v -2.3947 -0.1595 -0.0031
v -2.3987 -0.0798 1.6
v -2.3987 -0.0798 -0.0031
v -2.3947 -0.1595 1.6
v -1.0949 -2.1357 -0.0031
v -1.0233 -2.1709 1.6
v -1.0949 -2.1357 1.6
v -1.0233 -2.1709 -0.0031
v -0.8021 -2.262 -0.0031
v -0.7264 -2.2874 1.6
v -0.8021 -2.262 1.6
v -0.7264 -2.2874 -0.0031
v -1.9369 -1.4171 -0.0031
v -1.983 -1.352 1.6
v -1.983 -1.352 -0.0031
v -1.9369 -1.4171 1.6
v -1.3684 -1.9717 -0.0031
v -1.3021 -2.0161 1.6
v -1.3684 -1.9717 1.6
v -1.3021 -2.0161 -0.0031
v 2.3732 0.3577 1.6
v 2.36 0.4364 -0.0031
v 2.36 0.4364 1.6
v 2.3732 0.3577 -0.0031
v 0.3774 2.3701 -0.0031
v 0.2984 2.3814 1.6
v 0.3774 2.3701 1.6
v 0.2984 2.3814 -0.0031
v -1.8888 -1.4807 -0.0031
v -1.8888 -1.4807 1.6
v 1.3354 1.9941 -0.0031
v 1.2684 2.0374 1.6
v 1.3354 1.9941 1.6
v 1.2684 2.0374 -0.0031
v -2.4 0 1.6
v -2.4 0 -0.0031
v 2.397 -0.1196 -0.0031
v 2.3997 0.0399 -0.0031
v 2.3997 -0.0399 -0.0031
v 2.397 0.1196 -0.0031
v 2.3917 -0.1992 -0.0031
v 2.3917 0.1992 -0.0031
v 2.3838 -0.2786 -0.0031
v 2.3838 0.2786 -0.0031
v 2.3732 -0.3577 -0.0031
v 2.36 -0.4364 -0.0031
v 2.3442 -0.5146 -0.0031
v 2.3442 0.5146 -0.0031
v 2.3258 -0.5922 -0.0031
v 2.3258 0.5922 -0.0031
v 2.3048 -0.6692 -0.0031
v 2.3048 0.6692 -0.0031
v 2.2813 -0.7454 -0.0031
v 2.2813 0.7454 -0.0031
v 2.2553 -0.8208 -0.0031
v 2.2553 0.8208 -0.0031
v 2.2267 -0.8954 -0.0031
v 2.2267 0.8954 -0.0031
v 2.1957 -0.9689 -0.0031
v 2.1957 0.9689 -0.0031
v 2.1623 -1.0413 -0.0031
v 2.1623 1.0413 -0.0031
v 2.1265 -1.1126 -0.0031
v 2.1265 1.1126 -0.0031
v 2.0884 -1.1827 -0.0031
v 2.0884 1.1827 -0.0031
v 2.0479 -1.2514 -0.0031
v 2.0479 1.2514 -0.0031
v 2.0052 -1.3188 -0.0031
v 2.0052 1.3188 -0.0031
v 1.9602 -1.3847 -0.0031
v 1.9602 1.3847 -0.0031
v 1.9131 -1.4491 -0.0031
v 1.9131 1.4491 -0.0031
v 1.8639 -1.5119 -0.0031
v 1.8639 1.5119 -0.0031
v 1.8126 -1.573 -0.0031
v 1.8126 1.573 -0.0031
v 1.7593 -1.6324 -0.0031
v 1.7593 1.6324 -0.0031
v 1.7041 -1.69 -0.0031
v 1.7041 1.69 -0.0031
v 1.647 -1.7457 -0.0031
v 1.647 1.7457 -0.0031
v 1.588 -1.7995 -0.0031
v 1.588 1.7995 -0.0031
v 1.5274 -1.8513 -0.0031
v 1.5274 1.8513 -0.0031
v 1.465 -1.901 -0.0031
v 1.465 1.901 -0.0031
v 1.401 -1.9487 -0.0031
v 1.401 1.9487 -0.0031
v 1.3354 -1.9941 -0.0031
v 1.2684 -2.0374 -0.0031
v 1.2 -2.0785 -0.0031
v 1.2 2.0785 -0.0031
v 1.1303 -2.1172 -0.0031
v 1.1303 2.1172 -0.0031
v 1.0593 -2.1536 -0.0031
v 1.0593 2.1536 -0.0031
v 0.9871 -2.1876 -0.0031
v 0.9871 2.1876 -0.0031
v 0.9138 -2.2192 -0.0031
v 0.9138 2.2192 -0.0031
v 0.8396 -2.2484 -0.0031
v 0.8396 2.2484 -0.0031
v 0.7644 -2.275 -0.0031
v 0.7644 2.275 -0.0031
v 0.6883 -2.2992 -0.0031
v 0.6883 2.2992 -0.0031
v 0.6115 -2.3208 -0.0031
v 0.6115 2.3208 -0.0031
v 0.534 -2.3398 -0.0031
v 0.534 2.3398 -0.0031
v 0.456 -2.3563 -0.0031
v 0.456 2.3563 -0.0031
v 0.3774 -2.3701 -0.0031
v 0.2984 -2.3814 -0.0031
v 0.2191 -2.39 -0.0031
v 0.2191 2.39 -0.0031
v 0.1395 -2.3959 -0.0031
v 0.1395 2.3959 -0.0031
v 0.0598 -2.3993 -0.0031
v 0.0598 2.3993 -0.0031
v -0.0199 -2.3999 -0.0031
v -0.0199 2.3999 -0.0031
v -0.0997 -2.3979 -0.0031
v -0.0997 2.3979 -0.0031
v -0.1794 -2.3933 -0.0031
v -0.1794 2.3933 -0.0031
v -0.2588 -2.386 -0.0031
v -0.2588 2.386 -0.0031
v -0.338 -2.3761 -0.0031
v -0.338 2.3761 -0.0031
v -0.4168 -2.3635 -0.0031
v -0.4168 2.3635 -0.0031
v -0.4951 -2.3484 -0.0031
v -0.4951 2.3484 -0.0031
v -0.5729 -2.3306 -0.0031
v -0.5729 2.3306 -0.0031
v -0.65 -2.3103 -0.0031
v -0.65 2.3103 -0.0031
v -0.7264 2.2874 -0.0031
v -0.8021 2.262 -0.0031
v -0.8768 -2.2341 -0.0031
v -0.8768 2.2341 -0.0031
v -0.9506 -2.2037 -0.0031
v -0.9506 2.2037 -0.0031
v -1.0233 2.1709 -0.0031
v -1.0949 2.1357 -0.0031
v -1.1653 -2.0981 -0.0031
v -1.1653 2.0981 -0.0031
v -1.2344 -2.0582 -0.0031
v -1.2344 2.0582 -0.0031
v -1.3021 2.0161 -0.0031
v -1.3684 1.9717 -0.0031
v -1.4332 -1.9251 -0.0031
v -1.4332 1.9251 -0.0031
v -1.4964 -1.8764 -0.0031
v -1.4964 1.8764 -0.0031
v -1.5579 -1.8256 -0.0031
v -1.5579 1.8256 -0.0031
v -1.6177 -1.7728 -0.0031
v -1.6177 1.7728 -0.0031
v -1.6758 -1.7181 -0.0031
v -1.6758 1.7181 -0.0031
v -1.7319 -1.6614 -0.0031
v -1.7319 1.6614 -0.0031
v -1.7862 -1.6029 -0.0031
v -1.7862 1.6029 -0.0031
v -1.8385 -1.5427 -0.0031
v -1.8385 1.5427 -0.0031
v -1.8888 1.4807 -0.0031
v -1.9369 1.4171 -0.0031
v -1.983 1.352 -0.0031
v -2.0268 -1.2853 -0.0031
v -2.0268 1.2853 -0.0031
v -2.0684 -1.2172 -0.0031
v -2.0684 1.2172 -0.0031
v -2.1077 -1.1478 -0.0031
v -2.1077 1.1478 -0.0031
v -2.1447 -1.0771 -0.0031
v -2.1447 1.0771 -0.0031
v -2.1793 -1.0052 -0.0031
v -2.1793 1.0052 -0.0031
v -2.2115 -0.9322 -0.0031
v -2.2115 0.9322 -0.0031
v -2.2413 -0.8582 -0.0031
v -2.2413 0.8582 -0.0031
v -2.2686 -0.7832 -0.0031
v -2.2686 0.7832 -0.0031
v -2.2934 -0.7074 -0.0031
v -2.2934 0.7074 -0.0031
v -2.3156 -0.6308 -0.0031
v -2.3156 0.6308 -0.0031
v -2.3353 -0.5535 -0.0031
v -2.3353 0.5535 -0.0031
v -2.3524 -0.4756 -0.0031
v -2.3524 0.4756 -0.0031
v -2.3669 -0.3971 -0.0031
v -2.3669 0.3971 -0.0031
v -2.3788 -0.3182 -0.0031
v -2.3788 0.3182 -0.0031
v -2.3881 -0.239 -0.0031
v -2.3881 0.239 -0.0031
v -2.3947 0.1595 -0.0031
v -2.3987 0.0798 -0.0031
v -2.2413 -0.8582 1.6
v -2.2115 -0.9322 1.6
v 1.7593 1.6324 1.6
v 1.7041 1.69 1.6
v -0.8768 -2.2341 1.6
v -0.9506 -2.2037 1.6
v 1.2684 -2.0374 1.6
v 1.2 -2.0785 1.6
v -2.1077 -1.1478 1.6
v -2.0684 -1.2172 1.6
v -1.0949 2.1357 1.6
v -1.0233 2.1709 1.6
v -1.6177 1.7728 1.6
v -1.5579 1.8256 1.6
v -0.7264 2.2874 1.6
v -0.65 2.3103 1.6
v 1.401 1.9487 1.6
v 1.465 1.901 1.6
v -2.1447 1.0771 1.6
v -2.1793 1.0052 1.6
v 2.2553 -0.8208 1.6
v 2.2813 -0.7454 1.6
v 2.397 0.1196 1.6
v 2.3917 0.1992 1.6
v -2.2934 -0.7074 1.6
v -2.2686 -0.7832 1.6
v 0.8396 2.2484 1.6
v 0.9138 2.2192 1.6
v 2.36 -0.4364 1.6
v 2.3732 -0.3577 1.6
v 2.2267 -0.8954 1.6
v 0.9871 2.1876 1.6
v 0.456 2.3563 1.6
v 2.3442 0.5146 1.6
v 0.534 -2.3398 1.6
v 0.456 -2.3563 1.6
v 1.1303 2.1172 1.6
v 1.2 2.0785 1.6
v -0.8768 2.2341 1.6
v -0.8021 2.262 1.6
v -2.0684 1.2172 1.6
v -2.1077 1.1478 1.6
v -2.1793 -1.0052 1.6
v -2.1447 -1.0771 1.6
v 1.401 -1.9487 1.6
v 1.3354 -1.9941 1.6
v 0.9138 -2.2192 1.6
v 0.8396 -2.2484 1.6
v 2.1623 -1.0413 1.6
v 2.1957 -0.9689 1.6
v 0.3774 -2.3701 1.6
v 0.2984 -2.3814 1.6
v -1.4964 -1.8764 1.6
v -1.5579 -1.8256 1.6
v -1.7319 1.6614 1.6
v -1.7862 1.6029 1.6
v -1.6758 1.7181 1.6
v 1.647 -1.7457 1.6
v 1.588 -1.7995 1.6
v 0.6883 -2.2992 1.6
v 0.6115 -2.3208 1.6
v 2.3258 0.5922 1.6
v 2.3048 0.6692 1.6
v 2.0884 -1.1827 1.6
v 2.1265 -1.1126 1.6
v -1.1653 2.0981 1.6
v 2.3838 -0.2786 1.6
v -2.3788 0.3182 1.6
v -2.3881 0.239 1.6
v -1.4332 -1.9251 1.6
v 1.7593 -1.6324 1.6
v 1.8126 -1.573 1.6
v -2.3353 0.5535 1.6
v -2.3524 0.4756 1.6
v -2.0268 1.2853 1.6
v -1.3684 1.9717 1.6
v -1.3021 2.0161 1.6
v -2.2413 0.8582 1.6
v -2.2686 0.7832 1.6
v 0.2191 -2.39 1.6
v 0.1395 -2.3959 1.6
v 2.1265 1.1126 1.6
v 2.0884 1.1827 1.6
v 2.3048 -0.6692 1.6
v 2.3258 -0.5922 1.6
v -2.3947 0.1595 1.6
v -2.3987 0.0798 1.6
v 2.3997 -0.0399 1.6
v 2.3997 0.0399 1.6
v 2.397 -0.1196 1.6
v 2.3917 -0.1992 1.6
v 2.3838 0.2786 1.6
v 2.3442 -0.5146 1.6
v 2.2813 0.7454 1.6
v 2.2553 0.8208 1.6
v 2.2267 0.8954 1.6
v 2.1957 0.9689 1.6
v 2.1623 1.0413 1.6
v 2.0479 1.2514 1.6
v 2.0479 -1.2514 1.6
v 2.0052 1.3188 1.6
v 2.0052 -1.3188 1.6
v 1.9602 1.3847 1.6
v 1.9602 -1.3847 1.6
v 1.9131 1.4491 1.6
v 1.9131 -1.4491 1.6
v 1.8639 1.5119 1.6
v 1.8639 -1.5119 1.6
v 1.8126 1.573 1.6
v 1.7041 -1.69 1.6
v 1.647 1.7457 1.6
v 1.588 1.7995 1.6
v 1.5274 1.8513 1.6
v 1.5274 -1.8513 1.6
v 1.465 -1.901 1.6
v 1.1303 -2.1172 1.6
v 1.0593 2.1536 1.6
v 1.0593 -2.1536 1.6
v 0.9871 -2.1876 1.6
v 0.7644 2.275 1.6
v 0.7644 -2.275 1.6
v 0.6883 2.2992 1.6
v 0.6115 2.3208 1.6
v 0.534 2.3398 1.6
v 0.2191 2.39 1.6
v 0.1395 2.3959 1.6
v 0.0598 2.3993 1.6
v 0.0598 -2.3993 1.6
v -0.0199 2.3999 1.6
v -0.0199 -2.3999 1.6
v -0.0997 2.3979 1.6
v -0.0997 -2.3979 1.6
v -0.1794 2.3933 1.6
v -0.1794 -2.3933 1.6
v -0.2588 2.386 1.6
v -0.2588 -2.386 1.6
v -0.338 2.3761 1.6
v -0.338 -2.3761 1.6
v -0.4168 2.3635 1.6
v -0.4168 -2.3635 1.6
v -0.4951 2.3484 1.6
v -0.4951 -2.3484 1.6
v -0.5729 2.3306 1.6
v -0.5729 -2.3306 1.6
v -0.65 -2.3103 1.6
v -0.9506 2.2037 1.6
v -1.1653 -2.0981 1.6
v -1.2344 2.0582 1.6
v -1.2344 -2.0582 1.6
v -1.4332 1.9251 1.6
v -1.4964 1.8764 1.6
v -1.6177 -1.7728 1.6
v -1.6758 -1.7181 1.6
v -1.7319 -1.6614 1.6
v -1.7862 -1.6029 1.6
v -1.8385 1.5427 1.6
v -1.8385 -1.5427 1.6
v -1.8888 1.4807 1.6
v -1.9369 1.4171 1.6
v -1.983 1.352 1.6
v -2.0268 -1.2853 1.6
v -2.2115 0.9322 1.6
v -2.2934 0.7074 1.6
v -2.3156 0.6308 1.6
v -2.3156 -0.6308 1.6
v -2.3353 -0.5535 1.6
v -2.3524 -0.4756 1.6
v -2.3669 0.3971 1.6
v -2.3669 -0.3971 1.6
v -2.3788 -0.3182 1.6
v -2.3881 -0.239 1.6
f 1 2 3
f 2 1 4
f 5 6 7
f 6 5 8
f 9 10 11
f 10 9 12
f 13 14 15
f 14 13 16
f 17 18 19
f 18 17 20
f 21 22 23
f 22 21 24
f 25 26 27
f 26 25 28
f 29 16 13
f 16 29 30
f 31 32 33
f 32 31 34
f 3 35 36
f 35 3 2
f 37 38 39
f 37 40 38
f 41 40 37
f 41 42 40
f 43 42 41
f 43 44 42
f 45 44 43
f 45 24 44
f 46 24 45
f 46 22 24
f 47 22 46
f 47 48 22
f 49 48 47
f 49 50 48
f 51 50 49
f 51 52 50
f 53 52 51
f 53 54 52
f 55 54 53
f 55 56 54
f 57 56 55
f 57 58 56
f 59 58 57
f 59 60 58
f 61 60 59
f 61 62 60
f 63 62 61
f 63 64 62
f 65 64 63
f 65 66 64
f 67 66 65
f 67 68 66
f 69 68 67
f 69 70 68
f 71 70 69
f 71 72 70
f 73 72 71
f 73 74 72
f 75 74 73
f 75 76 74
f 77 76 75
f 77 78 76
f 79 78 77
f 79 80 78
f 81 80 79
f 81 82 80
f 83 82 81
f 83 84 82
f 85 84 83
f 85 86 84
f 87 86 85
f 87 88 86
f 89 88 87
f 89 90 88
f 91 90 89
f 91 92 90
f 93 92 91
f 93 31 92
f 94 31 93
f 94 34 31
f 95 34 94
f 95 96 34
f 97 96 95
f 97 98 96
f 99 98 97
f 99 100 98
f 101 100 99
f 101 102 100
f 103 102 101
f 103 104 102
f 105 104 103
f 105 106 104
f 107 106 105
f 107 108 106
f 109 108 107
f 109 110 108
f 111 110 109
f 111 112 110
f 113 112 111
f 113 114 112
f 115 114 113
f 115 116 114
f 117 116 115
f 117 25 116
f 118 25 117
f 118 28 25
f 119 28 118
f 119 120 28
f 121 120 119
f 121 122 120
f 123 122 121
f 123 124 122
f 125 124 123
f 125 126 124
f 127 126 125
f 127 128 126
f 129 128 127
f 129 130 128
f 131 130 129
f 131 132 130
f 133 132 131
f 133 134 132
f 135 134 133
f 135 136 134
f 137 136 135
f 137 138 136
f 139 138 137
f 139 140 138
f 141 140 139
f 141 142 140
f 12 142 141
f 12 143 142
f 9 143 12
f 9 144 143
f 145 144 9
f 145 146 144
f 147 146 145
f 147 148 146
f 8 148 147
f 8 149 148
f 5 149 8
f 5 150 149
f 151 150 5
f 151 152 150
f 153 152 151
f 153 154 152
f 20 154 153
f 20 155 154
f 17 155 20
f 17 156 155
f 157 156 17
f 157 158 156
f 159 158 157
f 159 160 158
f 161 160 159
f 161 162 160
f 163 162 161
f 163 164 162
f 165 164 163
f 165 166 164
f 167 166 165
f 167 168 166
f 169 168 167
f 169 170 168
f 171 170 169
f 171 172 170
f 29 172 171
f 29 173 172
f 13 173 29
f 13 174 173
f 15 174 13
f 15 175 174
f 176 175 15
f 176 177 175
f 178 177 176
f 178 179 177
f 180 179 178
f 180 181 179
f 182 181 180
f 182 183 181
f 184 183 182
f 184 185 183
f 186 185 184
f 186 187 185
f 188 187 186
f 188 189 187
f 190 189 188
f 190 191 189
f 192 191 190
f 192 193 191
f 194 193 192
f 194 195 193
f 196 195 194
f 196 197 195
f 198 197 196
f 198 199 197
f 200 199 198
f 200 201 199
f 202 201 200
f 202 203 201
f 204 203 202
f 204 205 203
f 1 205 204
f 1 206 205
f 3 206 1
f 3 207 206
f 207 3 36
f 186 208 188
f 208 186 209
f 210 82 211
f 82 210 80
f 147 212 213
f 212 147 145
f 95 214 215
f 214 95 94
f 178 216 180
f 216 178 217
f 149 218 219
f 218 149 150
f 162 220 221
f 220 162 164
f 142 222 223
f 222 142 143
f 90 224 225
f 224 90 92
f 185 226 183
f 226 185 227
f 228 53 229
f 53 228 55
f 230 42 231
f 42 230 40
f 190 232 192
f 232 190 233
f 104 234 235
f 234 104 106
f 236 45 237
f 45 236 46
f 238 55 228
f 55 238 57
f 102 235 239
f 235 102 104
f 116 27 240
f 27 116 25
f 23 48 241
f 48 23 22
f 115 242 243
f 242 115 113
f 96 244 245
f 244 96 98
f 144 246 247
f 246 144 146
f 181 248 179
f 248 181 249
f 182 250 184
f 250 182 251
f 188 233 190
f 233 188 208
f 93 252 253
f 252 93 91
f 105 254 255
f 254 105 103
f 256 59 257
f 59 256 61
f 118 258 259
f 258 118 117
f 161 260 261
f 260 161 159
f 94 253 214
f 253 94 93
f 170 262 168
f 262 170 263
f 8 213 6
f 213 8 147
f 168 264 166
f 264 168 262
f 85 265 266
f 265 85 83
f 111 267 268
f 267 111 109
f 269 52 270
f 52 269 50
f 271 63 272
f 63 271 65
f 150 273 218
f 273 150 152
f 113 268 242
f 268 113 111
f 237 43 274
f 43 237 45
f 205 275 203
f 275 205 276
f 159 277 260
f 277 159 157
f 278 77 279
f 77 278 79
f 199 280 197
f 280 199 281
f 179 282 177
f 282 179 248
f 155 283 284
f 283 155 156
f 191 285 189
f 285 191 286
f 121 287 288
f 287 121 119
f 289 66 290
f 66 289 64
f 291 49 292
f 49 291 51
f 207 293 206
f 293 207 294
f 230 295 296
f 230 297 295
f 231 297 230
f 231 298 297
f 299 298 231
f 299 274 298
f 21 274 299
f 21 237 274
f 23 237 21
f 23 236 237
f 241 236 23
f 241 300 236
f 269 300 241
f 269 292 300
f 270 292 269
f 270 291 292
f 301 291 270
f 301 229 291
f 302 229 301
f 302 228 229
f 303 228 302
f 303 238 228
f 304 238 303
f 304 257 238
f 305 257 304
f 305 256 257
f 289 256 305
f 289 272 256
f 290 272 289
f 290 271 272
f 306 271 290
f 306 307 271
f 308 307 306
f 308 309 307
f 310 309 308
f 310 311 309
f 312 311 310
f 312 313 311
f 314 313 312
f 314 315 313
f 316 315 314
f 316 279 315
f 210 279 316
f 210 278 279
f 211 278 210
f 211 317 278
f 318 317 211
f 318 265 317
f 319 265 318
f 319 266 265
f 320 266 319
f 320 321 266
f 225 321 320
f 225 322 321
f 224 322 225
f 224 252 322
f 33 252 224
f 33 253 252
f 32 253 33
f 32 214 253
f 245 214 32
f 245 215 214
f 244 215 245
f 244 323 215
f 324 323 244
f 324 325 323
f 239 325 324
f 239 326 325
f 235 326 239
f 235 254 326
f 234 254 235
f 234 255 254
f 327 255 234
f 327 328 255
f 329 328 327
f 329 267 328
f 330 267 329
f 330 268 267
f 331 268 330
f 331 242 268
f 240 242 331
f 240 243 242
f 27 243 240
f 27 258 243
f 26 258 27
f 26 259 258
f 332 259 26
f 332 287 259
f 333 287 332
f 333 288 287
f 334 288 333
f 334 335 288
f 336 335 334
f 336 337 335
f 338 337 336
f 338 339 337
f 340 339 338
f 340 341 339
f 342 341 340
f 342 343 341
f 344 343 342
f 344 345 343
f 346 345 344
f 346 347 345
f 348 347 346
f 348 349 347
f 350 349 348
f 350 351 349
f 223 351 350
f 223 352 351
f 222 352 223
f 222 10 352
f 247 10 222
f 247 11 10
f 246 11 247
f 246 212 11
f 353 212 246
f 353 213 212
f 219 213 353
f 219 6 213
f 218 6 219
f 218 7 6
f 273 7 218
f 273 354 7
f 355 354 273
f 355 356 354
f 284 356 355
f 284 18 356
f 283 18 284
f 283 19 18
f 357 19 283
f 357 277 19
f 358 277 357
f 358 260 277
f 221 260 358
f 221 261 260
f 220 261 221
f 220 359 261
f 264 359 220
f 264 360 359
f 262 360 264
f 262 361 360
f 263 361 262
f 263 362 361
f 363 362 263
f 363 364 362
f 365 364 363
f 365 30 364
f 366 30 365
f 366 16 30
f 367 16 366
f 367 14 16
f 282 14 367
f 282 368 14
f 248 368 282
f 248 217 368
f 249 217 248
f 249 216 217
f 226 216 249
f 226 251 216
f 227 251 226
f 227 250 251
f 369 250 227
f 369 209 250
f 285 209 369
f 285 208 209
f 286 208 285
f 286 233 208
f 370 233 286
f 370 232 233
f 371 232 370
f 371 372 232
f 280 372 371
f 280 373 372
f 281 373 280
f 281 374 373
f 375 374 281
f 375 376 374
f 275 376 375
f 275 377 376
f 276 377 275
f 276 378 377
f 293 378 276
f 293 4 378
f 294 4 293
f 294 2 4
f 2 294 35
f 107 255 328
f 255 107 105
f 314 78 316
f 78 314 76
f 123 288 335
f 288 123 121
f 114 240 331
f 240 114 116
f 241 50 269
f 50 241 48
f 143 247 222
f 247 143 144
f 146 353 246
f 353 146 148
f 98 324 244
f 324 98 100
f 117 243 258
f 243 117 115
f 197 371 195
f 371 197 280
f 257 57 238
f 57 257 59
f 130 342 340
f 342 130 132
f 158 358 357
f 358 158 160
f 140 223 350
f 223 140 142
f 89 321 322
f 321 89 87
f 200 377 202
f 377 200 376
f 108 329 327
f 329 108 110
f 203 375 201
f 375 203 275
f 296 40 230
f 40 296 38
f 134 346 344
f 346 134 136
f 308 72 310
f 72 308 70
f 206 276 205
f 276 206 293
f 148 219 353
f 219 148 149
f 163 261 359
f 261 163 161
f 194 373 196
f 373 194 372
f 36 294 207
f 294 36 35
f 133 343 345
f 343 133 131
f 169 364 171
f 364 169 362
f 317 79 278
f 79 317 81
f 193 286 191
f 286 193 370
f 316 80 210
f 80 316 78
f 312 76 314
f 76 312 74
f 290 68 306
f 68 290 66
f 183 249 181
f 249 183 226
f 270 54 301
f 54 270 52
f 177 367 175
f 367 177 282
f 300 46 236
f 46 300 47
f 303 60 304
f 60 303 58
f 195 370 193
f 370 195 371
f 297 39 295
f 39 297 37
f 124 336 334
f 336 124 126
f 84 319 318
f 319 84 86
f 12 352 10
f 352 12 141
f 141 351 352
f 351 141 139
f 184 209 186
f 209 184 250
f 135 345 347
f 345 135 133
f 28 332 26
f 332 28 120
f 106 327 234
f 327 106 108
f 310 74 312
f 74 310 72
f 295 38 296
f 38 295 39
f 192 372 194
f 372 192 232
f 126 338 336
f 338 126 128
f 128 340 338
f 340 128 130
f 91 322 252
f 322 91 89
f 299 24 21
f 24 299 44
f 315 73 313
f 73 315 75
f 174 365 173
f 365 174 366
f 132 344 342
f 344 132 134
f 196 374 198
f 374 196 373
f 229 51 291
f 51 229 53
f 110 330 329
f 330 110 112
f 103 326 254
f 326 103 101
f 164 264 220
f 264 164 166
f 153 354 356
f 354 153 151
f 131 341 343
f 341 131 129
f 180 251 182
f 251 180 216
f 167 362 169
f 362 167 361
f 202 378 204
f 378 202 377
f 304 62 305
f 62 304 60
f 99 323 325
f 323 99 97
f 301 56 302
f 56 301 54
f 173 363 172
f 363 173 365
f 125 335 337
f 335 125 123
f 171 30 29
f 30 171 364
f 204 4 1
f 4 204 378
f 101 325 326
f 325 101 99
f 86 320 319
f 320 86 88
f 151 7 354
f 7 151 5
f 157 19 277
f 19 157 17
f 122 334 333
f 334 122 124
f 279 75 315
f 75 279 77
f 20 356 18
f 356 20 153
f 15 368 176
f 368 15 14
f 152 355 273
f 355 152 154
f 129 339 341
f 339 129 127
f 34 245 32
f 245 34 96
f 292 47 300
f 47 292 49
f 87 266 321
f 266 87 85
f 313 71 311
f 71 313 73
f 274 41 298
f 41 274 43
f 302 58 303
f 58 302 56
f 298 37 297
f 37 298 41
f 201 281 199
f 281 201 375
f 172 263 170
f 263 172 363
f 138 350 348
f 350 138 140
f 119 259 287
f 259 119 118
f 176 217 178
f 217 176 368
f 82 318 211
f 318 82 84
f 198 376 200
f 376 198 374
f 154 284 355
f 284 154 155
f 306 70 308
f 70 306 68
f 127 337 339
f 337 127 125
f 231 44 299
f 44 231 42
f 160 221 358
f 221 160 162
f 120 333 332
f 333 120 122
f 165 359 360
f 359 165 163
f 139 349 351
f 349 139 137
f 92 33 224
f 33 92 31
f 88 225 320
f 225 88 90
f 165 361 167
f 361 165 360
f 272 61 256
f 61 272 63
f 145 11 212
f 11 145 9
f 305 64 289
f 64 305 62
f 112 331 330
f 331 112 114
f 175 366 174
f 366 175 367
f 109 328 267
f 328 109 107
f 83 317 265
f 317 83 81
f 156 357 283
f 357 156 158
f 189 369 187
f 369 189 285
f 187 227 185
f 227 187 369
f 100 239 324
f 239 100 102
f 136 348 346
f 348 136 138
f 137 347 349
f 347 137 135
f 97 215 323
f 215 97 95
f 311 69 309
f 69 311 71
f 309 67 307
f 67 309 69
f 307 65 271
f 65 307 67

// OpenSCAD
// file: ../p/4-4edge.scad
use <../lib.scad>
$fa=1; $fs=0.2;
function ldraw_lib__4_4edge(realsolid=false) = [
// 0 Circle 1.0
// 0 Name: 4-4edge.dat
// 0 Author: James Jessiman
// 0 !LDRAW_ORG Primitive UPDATE 2017-01
// 0 !LICENSE Licensed under CC BY 2.0 and CC BY 4.0 : see CAreadme.txt
// 
// 0 BFC CERTIFY CCW
  [0,"BFC","CERTIFY"],
  [0,"BFC","CCW"],
// 
// 0 !HISTORY 1998-12-15 [PTadmin] Official Update 1998-10
// 0 !HISTORY 2005-12-28 [PTadmin] Official Update 2005-01
// 0 !HISTORY 2007-06-24 [PTadmin] Header formatted for Contributor Agreement
// 0 !HISTORY 2008-07-01 [PTadmin] Official Update 2008-01
// 0 !HISTORY 2017-01-15 [Steffen] BFCed
// 0 !HISTORY 2017-12-30 [PTadmin] Official Update 2017-01
// 
// 
// 2 24 1 0 0 0.9239 0 0.3827
  [2,24,1,0,0,0.9239,0,0.3827],
// 2 24 0.9239 0 0.3827 0.7071 0 0.7071
  [2,24,0.9239,0,0.3827,0.7071,0,0.7071],
// 2 24 0.7071 0 0.7071 0.3827 0 0.9239
  [2,24,0.7071,0,0.7071,0.3827,0,0.9239],
// 2 24 0.3827 0 0.9239 0 0 1
  [2,24,0.3827,0,0.9239,0,0,1],
// 2 24 0 0 1 -0.3827 0 0.9239
  [2,24,0,0,1,-0.3827,0,0.9239],
// 2 24 -0.3827 0 0.9239 -0.7071 0 0.7071
  [2,24,-0.3827,0,0.9239,-0.7071,0,0.7071],
// 2 24 -0.7071 0 0.7071 -0.9239 0 0.3827
  [2,24,-0.7071,0,0.7071,-0.9239,0,0.3827],
// 2 24 -0.9239 0 0.3827 -1 0 -0
  [2,24,-0.9239,0,0.3827,-1,0,-0],
// 2 24 -1 0 -0 -0.9239 0 -0.3827
  [2,24,-1,0,-0,-0.9239,0,-0.3827],
// 2 24 -0.9239 0 -0.3827 -0.7071 0 -0.7071
  [2,24,-0.9239,0,-0.3827,-0.7071,0,-0.7071],
// 2 24 -0.7071 0 -0.7071 -0.3827 0 -0.9239
  [2,24,-0.7071,0,-0.7071,-0.3827,0,-0.9239],
// 2 24 -0.3827 0 -0.9239 0 0 -1
  [2,24,-0.3827,0,-0.9239,0,0,-1],
// 2 24 0 0 -1 0.3827 0 -0.9239
  [2,24,0,0,-1,0.3827,0,-0.9239],
// 2 24 0.3827 0 -0.9239 0.7071 0 -0.7071
  [2,24,0.3827,0,-0.9239,0.7071,0,-0.7071],
// 2 24 0.7071 0 -0.7071 0.9239 0 -0.3827
  [2,24,0.7071,0,-0.7071,0.9239,0,-0.3827],
// 2 24 0.9239 0 -0.3827 1 0 0
  [2,24,0.9239,0,-0.3827,1,0,0],
];
module ldraw_lib__4_4edge(step=0, col=false, unit=2/5, alt=false, line=0.2, solid=!$preview)
    makepoly(ldraw_lib__4_4edge(solid), step=step, col=col, unit=unit, alt=alt, line=line, solid=solid);
ldraw_lib__4_4edge(line=0.2);
// file: ../p/4-4disc.scad
use <../lib.scad>
$fa=1; $fs=0.2;
function ldraw_lib__4_4disc(realsolid=false) = [
// 0 Disc 1.0
// 0 Name: 4-4disc.dat
// 0 Author: James Jessiman
// 0 !LDRAW_ORG Primitive UPDATE 2002-02
// 0 !LICENSE Licensed under CC BY 2.0 and CC BY 4.0 : see CAreadme.txt
// 
// 0 BFC CERTIFY CCW
  [0,"BFC","CERTIFY"],
  [0,"BFC","CCW"],
// 
// 0 !HISTORY 1998-12-15 [PTadmin] Official Update 1998-10
// 0 !HISTORY 2002-03-23 [sbliss] Added BFC statement
// 0 !HISTORY 2002-04-25 [PTadmin] Official Update 2002-02
// 0 !HISTORY 2007-06-24 [PTadmin] Header formatted for Contributor Agreement
// 0 !HISTORY 2008-07-01 [PTadmin] Official Update 2008-01
// 
// 
// 3 16 0 0 0 1 0 0 0.9239 0 0.3827
  [3,16,0,0,0,1,0,0,0.9239,0,0.3827],
// 3 16 0 0 0 0.9239 0 0.3827 0.7071 0 0.7071
  [3,16,0,0,0,0.9239,0,0.3827,0.7071,0,0.7071],
// 3 16 0 0 0 0.7071 0 0.7071 0.3827 0 0.9239
  [3,16,0,0,0,0.7071,0,0.7071,0.3827,0,0.9239],
// 3 16 0 0 0 0.3827 0 0.9239 0 0 1
  [3,16,0,0,0,0.3827,0,0.9239,0,0,1],
// 3 16 0 0 0 0 0 1 -0.3827 0 0.9239
  [3,16,0,0,0,0,0,1,-0.3827,0,0.9239],
// 3 16 0 0 0 -0.3827 0 0.9239 -0.7071 0 0.7071
  [3,16,0,0,0,-0.3827,0,0.9239,-0.7071,0,0.7071],
// 3 16 0 0 0 -0.7071 0 0.7071 -0.9239 0 0.3827
  [3,16,0,0,0,-0.7071,0,0.7071,-0.9239,0,0.3827],
// 3 16 0 0 0 -0.9239 0 0.3827 -1 0 -0
  [3,16,0,0,0,-0.9239,0,0.3827,-1,0,-0],
// 3 16 0 0 0 -1 0 -0 -0.9239 0 -0.3827
  [3,16,0,0,0,-1,0,-0,-0.9239,0,-0.3827],
// 3 16 0 0 0 -0.9239 0 -0.3827 -0.7071 0 -0.7071
  [3,16,0,0,0,-0.9239,0,-0.3827,-0.7071,0,-0.7071],
// 3 16 0 0 0 -0.7071 0 -0.7071 -0.3827 0 -0.9239
  [3,16,0,0,0,-0.7071,0,-0.7071,-0.3827,0,-0.9239],
// 3 16 0 0 0 -0.3827 0 -0.9239 0 0 -1
  [3,16,0,0,0,-0.3827,0,-0.9239,0,0,-1],
// 3 16 0 0 0 0 0 -1 0.3827 0 -0.9239
  [3,16,0,0,0,0,0,-1,0.3827,0,-0.9239],
// 3 16 0 0 0 0.3827 0 -0.9239 0.7071 0 -0.7071
  [3,16,0,0,0,0.3827,0,-0.9239,0.7071,0,-0.7071],
// 3 16 0 0 0 0.7071 0 -0.7071 0.9239 0 -0.3827
  [3,16,0,0,0,0.7071,0,-0.7071,0.9239,0,-0.3827],
// 3 16 0 0 0 0.9239 0 -0.3827 1 0 0
  [3,16,0,0,0,0.9239,0,-0.3827,1,0,0],
// 0
];
module ldraw_lib__4_4disc(step=0, col=false, unit=2/5, alt=false, line=0.2, solid=!$preview)
    makepoly(ldraw_lib__4_4disc(solid), step=step, col=col, unit=unit, alt=alt, line=line, solid=solid);
ldraw_lib__4_4disc(line=0.2);
// file: ../p/4-4cyli.scad
use <../lib.scad>
$fa=1; $fs=0.2;
function ldraw_lib__4_4cyli(realsolid=false) = [
// 0 Cylinder 1.0
// 0 Name: 4-4cyli.dat
// 0 Author: James Jessiman
// 0 !LDRAW_ORG Primitive UPDATE 2005-01
// 0 !LICENSE Licensed under CC BY 2.0 and CC BY 4.0 : see CAreadme.txt
// 
// 0 BFC CERTIFY CCW
  [0,"BFC","CERTIFY"],
  [0,"BFC","CCW"],
// 
// 0 !HISTORY 1998-12-15 [PTadmin] Official Update 1998-10
// 0 !HISTORY 2002-03-23 [sbliss] Added BFC statement; merged headers from files in distributions LDraw 0.27 and Complete.
// 0 !HISTORY 2002-04-25 [PTadmin] Official Update 2002-02
// 0 !HISTORY 2004-12-14 [guyvivan] BFC CCW
// 0 !HISTORY 2005-12-28 [PTadmin] Official Update 2005-01
// 0 !HISTORY 2007-06-24 [PTadmin] Header formatted for Contributor Agreement
// 0 !HISTORY 2008-07-01 [PTadmin] Official Update 2008-01
// 
// 
// 4 16 1 1 0 0.9239 1 0.3827 0.9239 0 0.3827 1 0 0
  [4,16,1,1,0,0.9239,1,0.3827,0.9239,0,0.3827,1,0,0],
// 5 24 1 0 0 1 1 0 0.9239 0 0.3827 0.9239 0 -0.3827
  [5,24,1,0,0,1,1,0,0.9239,0,0.3827,0.9239,0,-0.3827],
// 4 16 0.9239 1 0.3827 0.7071 1 0.7071 0.7071 0 0.7071 0.9239 0 0.3827
  [4,16,0.9239,1,0.3827,0.7071,1,0.7071,0.7071,0,0.7071,0.9239,0,0.3827],
// 5 24 0.9239 0 0.3827 0.9239 1 0.3827 0.7071 0 0.7071 1 0 0
  [5,24,0.9239,0,0.3827,0.9239,1,0.3827,0.7071,0,0.7071,1,0,0],
// 4 16 0.7071 1 0.7071 0.3827 1 0.9239 0.3827 0 0.9239 0.7071 0 0.7071
  [4,16,0.7071,1,0.7071,0.3827,1,0.9239,0.3827,0,0.9239,0.7071,0,0.7071],
// 5 24 0.7071 0 0.7071 0.7071 1 0.7071 0.3827 0 0.9239 0.9239 0 0.3827
  [5,24,0.7071,0,0.7071,0.7071,1,0.7071,0.3827,0,0.9239,0.9239,0,0.3827],
// 4 16 0.3827 1 0.9239 0 1 1 0 0 1 0.3827 0 0.9239
  [4,16,0.3827,1,0.9239,0,1,1,0,0,1,0.3827,0,0.9239],
// 5 24 0.3827 0 0.9239 0.3827 1 0.9239 0 0 1 0.7071 0 0.7071
  [5,24,0.3827,0,0.9239,0.3827,1,0.9239,0,0,1,0.7071,0,0.7071],
// 4 16 0 1 1 -0.3827 1 0.9239 -0.3827 0 0.9239 0 0 1
  [4,16,0,1,1,-0.3827,1,0.9239,-0.3827,0,0.9239,0,0,1],
// 5 24 0 0 1 0 1 1 -0.3827 0 0.9239 0.3827 0 0.9239
  [5,24,0,0,1,0,1,1,-0.3827,0,0.9239,0.3827,0,0.9239],
// 4 16 -0.3827 1 0.9239 -0.7071 1 0.7071 -0.7071 0 0.7071 -0.3827 0 0.9239
  [4,16,-0.3827,1,0.9239,-0.7071,1,0.7071,-0.7071,0,0.7071,-0.3827,0,0.9239],
// 5 24 -0.3827 0 0.9239 -0.3827 1 0.9239 -0.7071 0 0.7071 0 0 1
  [5,24,-0.3827,0,0.9239,-0.3827,1,0.9239,-0.7071,0,0.7071,0,0,1],
// 4 16 -0.7071 1 0.7071 -0.9239 1 0.3827 -0.9239 0 0.3827 -0.7071 0 0.7071
  [4,16,-0.7071,1,0.7071,-0.9239,1,0.3827,-0.9239,0,0.3827,-0.7071,0,0.7071],
// 5 24 -0.7071 0 0.7071 -0.7071 1 0.7071 -0.9239 0 0.3827 -0.3827 0 0.9239
  [5,24,-0.7071,0,0.7071,-0.7071,1,0.7071,-0.9239,0,0.3827,-0.3827,0,0.9239],
// 4 16 -0.9239 1 0.3827 -1 1 0 -1 0 0 -0.9239 0 0.3827
  [4,16,-0.9239,1,0.3827,-1,1,0,-1,0,0,-0.9239,0,0.3827],
// 5 24 -0.9239 0 0.3827 -0.9239 1 0.3827 -1 0 0 -0.7071 0 0.7071
  [5,24,-0.9239,0,0.3827,-0.9239,1,0.3827,-1,0,0,-0.7071,0,0.7071],
// 4 16 -1 1 0 -0.9239 1 -0.3827 -0.9239 0 -0.3827 -1 0 0
  [4,16,-1,1,0,-0.9239,1,-0.3827,-0.9239,0,-0.3827,-1,0,0],
// 5 24 -1 0 0 -1 1 0 -0.9239 0 -0.3827 -0.9239 0 0.3827
  [5,24,-1,0,0,-1,1,0,-0.9239,0,-0.3827,-0.9239,0,0.3827],
// 4 16 -0.9239 1 -0.3827 -0.7071 1 -0.7071 -0.7071 0 -0.7071 -0.9239 0 -0.3827
  [4,16,-0.9239,1,-0.3827,-0.7071,1,-0.7071,-0.7071,0,-0.7071,-0.9239,0,-0.3827],
// 5 24 -0.9239 0 -0.3827 -0.9239 1 -0.3827 -0.7071 0 -0.7071 -1 0 0
  [5,24,-0.9239,0,-0.3827,-0.9239,1,-0.3827,-0.7071,0,-0.7071,-1,0,0],
// 4 16 -0.7071 1 -0.7071 -0.3827 1 -0.9239 -0.3827 0 -0.9239 -0.7071 0 -0.7071
  [4,16,-0.7071,1,-0.7071,-0.3827,1,-0.9239,-0.3827,0,-0.9239,-0.7071,0,-0.7071],
// 5 24 -0.7071 0 -0.7071 -0.7071 1 -0.7071 -0.3827 0 -0.9239 -0.9239 0 -0.3827
  [5,24,-0.7071,0,-0.7071,-0.7071,1,-0.7071,-0.3827,0,-0.9239,-0.9239,0,-0.3827],
// 4 16 -0.3827 1 -0.9239 0 1 -1 0 0 -1 -0.3827 0 -0.9239
  [4,16,-0.3827,1,-0.9239,0,1,-1,0,0,-1,-0.3827,0,-0.9239],
// 5 24 -0.3827 0 -0.9239 -0.3827 1 -0.9239 0 0 -1 -0.7071 0 -0.7071
  [5,24,-0.3827,0,-0.9239,-0.3827,1,-0.9239,0,0,-1,-0.7071,0,-0.7071],
// 4 16 0 1 -1 0.3827 1 -0.9239 0.3827 0 -0.9239 0 0 -1
  [4,16,0,1,-1,0.3827,1,-0.9239,0.3827,0,-0.9239,0,0,-1],
// 5 24 0 0 -1 0 1 -1 0.3827 0 -0.9239 -0.3827 0 -0.9239
  [5,24,0,0,-1,0,1,-1,0.3827,0,-0.9239,-0.3827,0,-0.9239],
// 4 16 0.3827 1 -0.9239 0.7071 1 -0.7071 0.7071 0 -0.7071 0.3827 0 -0.9239
  [4,16,0.3827,1,-0.9239,0.7071,1,-0.7071,0.7071,0,-0.7071,0.3827,0,-0.9239],
// 5 24 0.3827 0 -0.9239 0.3827 1 -0.9239 0.7071 0 -0.7071 0 0 -1
  [5,24,0.3827,0,-0.9239,0.3827,1,-0.9239,0.7071,0,-0.7071,0,0,-1],
// 4 16 0.7071 1 -0.7071 0.9239 1 -0.3827 0.9239 0 -0.3827 0.7071 0 -0.7071
  [4,16,0.7071,1,-0.7071,0.9239,1,-0.3827,0.9239,0,-0.3827,0.7071,0,-0.7071],
// 5 24 0.7071 0 -0.7071 0.7071 1 -0.7071 0.9239 0 -0.3827 0.3827 0 -0.9239
  [5,24,0.7071,0,-0.7071,0.7071,1,-0.7071,0.9239,0,-0.3827,0.3827,0,-0.9239],
// 4 16 0.9239 1 -0.3827 1 1 0 1 0 0 0.9239 0 -0.3827
  [4,16,0.9239,1,-0.3827,1,1,0,1,0,0,0.9239,0,-0.3827],
// 5 24 0.9239 0 -0.3827 0.9239 1 -0.3827 1 0 0 0.7071 0 -0.7071
  [5,24,0.9239,0,-0.3827,0.9239,1,-0.3827,1,0,0,0.7071,0,-0.7071],
// 0
];
module ldraw_lib__4_4cyli(step=0, col=false, unit=2/5, alt=false, line=0.2, solid=!$preview)
    makepoly(ldraw_lib__4_4cyli(solid), step=step, col=col, unit=unit, alt=alt, line=line, solid=solid);
ldraw_lib__4_4cyli(line=0.2);
// file: ../p/stud3.scad
use <../lib.scad>
use <4-4cyli.scad>
use <4-4disc.scad>
use <4-4edge.scad>
$fa=1; $fs=0.2;
function ldraw_lib__stud3(realsolid=false) = realsolid ? 
    [openscad(translate([0,0,-eps()], o=cylinder(4+eps(), r=4)),2)] : [
// 0 Stud Tube Solid
// 0 Name: stud3.dat
// 0 Author: James Jessiman
// 0 !LDRAW_ORG Primitive UPDATE 2012-01
// 0 !LICENSE Licensed under CC BY 2.0 and CC BY 4.0 : see CAreadme.txt
// 
// 0 BFC CERTIFY CCW
  [0,"BFC","CERTIFY"],
  [0,"BFC","CCW"],
// 
// 0 !HISTORY 2002-04-04 [sbliss] Modified for BFC compliance
// 0 !HISTORY 2002-04-25 [PTadmin] Official Update 2002-02
// 0 !HISTORY 2007-06-24 [PTadmin] Header formatted for Contributor Agreement
// 0 !HISTORY 2008-07-01 [PTadmin] Official Update 2008-01
// 0 !HISTORY 2012-02-16 [Philo] Changed to CCW
// 0 !HISTORY 2012-03-30 [PTadmin] Official Update 2012-01
// 
// 
// 1 16 0 -4 0 4 0 0 0 1 0 0 0 4 4-4edge.dat
  [1,16,0,-4,0,4,0,0,0,1,0,0,0,4, ldraw_lib__4_4edge(realsolid)],
// 1 16 0 0 0 4 0 0 0 1 0 0 0 4 4-4edge.dat
  [1,16,0,0,0,4,0,0,0,1,0,0,0,4, ldraw_lib__4_4edge(realsolid)],
// 1 16 0 -4 0 4 0 0 0 1 0 0 0 4 4-4disc.dat
  [1,16,0,-4,0,4,0,0,0,1,0,0,0,4, ldraw_lib__4_4disc(realsolid)],
// 1 16 0 -4 0 4 0 0 0 4 0 0 0 4 4-4cyli.dat
  [1,16,0,-4,0,4,0,0,0,4,0,0,0,4, ldraw_lib__4_4cyli(realsolid)],
];
module ldraw_lib__stud3(step=0, col=false, unit=2/5, alt=false, line=0.2, solid=!$preview)
    makepoly(ldraw_lib__stud3(solid), step=step, col=col, unit=unit, alt=alt, line=line, solid=solid);
ldraw_lib__stud3(line=0.2);
// file: ../p/stud.scad
use <../lib.scad>
use <4-4cyli.scad>
use <4-4disc.scad>
use <4-4edge.scad>
$fa=1; $fs=0.2;
function ldraw_lib__stud(realsolid=false) = realsolid ? 
    [openscad(translate([0,0,-eps()], o=cylinder(4+eps(), r=6)),2)] : [
// 0 Stud
// 0 Name: stud.dat
// 0 Author: James Jessiman
// 0 !LDRAW_ORG Primitive UPDATE 2012-01
// 0 !LICENSE Licensed under CC BY 2.0 and CC BY 4.0 : see CAreadme.txt
// 
// 0 BFC CERTIFY CCW
  [0,"BFC","CERTIFY"],
  [0,"BFC","CCW"],
// 
// 0 !HISTORY 2002-04-04 [sbliss] Modified for BFC compliance
// 0 !HISTORY 2002-04-25 [PTadmin] Official Update 2002-02
// 0 !HISTORY 2007-06-24 [PTadmin] Header formatted for Contributor Agreement
// 0 !HISTORY 2008-07-01 [PTadmin] Official Update 2008-01
// 0 !HISTORY 2012-02-16 [Philo] Changed to CCW
// 0 !HISTORY 2012-03-30 [PTadmin] Official Update 2012-01
// 
// 
// 1 16 0 0 0 6 0 0 0 1 0 0 0 6 4-4edge.dat
  [1,16,0,0,0,6,0,0,0,1,0,0,0,6, ldraw_lib__4_4edge(realsolid)],
// 1 16 0 -4 0 6 0 0 0 1 0 0 0 6 4-4edge.dat
  [1,16,0,-4,0,6,0,0,0,1,0,0,0,6, ldraw_lib__4_4edge(realsolid)],
// 1 16 0 0 0 6 0 0 0 -4 0 0 0 6 4-4cyli.dat
  [1,16,0,0,0,6,0,0,0,-4,0,0,0,6, ldraw_lib__4_4cyli(realsolid)],
// 1 16 0 -4 0 6 0 0 0 1 0 0 0 6 4-4disc.dat
  [1,16,0,-4,0,6,0,0,0,1,0,0,0,6, ldraw_lib__4_4disc(realsolid)],
];
module ldraw_lib__stud(step=0, col=false, unit=2/5, alt=false, line=0.2, solid=!$preview)
    makepoly(ldraw_lib__stud(solid), step=step, col=col, unit=unit, alt=alt, line=line, solid=solid);
ldraw_lib__stud(line=0.2);
// file: ../p/box5.scad
use <../lib.scad>
$fa=1; $fs=0.2;
function ldraw_lib__box5(realsolid=false) = [
// 0 Box with 5 Faces and All Edges
// 0 Name: box5.dat
// 0 Author: James Jessiman
// 0 !LDRAW_ORG Primitive UPDATE 2012-01
// 0 !LICENSE Licensed under CC BY 2.0 and CC BY 4.0 : see CAreadme.txt
// 
// 0 BFC CERTIFY CCW
  [0,"BFC","CERTIFY"],
  [0,"BFC","CCW"],
// 
// 0 !HISTORY 2002-04-03 [sbliss] Modified for BFC compliance
// 0 !HISTORY 2002-04-25 [PTadmin] Official Update 2002-02
// 0 !HISTORY 2007-06-24 [PTadmin] Header formatted for Contributor Agreement
// 0 !HISTORY 2008-07-01 [PTadmin] Official Update 2008-01
// 0 !HISTORY 2012-02-16 [Philo] Changed to CCW
// 0 !HISTORY 2012-03-30 [PTadmin] Official Update 2012-01
// 
// 
// 2 24 1 1 1 -1 1 1
  [2,24,1,1,1,-1,1,1],
// 2 24 -1 1 1 -1 1 -1
  [2,24,-1,1,1,-1,1,-1],
// 2 24 -1 1 -1 1 1 -1
  [2,24,-1,1,-1,1,1,-1],
// 2 24 1 1 -1 1 1 1
  [2,24,1,1,-1,1,1,1],
// 2 24 1 0 1 -1 0 1
  [2,24,1,0,1,-1,0,1],
// 2 24 -1 0 1 -1 0 -1
  [2,24,-1,0,1,-1,0,-1],
// 2 24 -1 0 -1 1 0 -1
  [2,24,-1,0,-1,1,0,-1],
// 2 24 1 0 -1 1 0 1
  [2,24,1,0,-1,1,0,1],
// 2 24 1 0 1 1 1 1
  [2,24,1,0,1,1,1,1],
// 2 24 -1 0 1 -1 1 1
  [2,24,-1,0,1,-1,1,1],
// 2 24 1 0 -1 1 1 -1
  [2,24,1,0,-1,1,1,-1],
// 2 24 -1 0 -1 -1 1 -1
  [2,24,-1,0,-1,-1,1,-1],
// 4 16 -1 1 1 1 1 1 1 1 -1 -1 1 -1
  [4,16,-1,1,1,1,1,1,1,1,-1,-1,1,-1],
// 4 16 -1 1 1 -1 0 1 1 0 1 1 1 1
  [4,16,-1,1,1,-1,0,1,1,0,1,1,1,1],
// 4 16 -1 1 -1 -1 0 -1 -1 0 1 -1 1 1
  [4,16,-1,1,-1,-1,0,-1,-1,0,1,-1,1,1],
// 4 16 1 1 -1 1 0 -1 -1 0 -1 -1 1 -1
  [4,16,1,1,-1,1,0,-1,-1,0,-1,-1,1,-1],
// 4 16 1 1 1 1 0 1 1 0 -1 1 1 -1
  [4,16,1,1,1,1,0,1,1,0,-1,1,1,-1],
];
module ldraw_lib__box5(step=0, col=false, unit=2/5, alt=false, line=0.2, solid=!$preview)
    makepoly(ldraw_lib__box5(solid), step=step, col=col, unit=unit, alt=alt, line=line, solid=solid);
ldraw_lib__box5(line=0.2);
// file: ../p/box4t.scad
use <../lib.scad>
$fa=1; $fs=0.2;
function ldraw_lib__box4t(realsolid=false) = [
// 0 Box with 4 Adjacent Faces and All Edges
// 0 Name: box4t.dat
// 0 Author: Tore Eriksson [Tore_Eriksson]
// 0 !LDRAW_ORG Primitive UPDATE 2003-02
// 0 !LICENSE Licensed under CC BY 2.0 and CC BY 4.0 : see CAreadme.txt
// 
// 0 BFC CERTIFY CCW
  [0,"BFC","CERTIFY"],
  [0,"BFC","CCW"],
// 
// 0 !HISTORY 1997-09-29 [PTadmin] Official Update 1997-15
// 0 !HISTORY 2002-08-31 [izanette] Modified with WINDZ for BFC compliance
// 0 !HISTORY 2003-08-01 [PTadmin] Official Update 2003-02
// 0 !HISTORY 2007-06-24 [PTadmin] Header formatted for Contributor Agreement
// 0 !HISTORY 2008-07-01 [PTadmin] Official Update 2008-01
// 
// 
// 2 24 1 1 1 -1 1 1
  [2,24,1,1,1,-1,1,1],
// 2 24 -1 1 1 -1 1 -1
  [2,24,-1,1,1,-1,1,-1],
// 2 24 -1 1 -1 1 1 -1
  [2,24,-1,1,-1,1,1,-1],
// 2 24 1 1 -1 1 1 1
  [2,24,1,1,-1,1,1,1],
// 2 24 1 0 1 -1 0 1
  [2,24,1,0,1,-1,0,1],
// 2 24 -1 0 1 -1 0 -1
  [2,24,-1,0,1,-1,0,-1],
// 2 24 -1 0 -1 1 0 -1
  [2,24,-1,0,-1,1,0,-1],
// 2 24 1 0 -1 1 0 1
  [2,24,1,0,-1,1,0,1],
// 2 24 1 0 1 1 1 1
  [2,24,1,0,1,1,1,1],
// 2 24 -1 0 1 -1 1 1
  [2,24,-1,0,1,-1,1,1],
// 2 24 1 0 -1 1 1 -1
  [2,24,1,0,-1,1,1,-1],
// 2 24 -1 0 -1 -1 1 -1
  [2,24,-1,0,-1,-1,1,-1],
// 4 16 1 1 1 1 1 -1 -1 1 -1 -1 1 1
  [4,16,1,1,1,1,1,-1,-1,1,-1,-1,1,1],
// 4 16 1 1 1 -1 1 1 -1 0 1 1 0 1
  [4,16,1,1,1,-1,1,1,-1,0,1,1,0,1],
// 4 16 -1 1 1 -1 1 -1 -1 0 -1 -1 0 1
  [4,16,-1,1,1,-1,1,-1,-1,0,-1,-1,0,1],
// 0 4 16 -1 1 -1 -1 0 -1 1 0 -1 1 1 -1
// 4 16 1 1 -1 1 1 1 1 0 1 1 0 -1
  [4,16,1,1,-1,1,1,1,1,0,1,1,0,-1],
// 0
];
module ldraw_lib__box4t(step=0, col=false, unit=2/5, alt=false, line=0.2, solid=!$preview)
    makepoly(ldraw_lib__box4t(solid), step=step, col=col, unit=unit, alt=alt, line=line, solid=solid);
ldraw_lib__box4t(line=0.2);
// file: s/3004s01.scad
use <../../lib.scad>
use <../../p/box4t.scad>
use <../../p/box5.scad>
use <../../p/stud.scad>
use <../../p/stud3.scad>
$fa=1; $fs=0.2;
function ldraw_lib__s__3004s01(realsolid=false) = [
// 0 ~Brick  1 x  2 without Front Face
// 0 Name: s\3004s01.dat
// 0 Author: James Jessiman
// 0 !LDRAW_ORG Subpart UPDATE 2003-03
// 0 !LICENSE Licensed under CC BY 2.0 and CC BY 4.0 : see CAreadme.txt
// 
// 0 BFC CERTIFY CCW
  [0,"BFC","CERTIFY"],
  [0,"BFC","CCW"],
// 
// 0 !HISTORY 2003-09-07 [jriley] Subfiling, BFC
// 0 !HISTORY 2003-12-19 [PTadmin] Official Update 2003-03
// 0 !HISTORY 2007-08-29 [PTadmin] Header formatted for Contributor Agreement
// 0 !HISTORY 2008-07-01 [PTadmin] Official Update 2008-01
// 
// 
// 1 16 0 4 0 1 0 0 0 -5 0 0 0 1 stud3.dat
  [1,16,0,4,0,1,0,0,0,-5,0,0,0,1, ldraw_lib__stud3(realsolid)],
// 0 BFC INVERTNEXT
  [0,"BFC","INVERTNEXT"],
// 1 16 0 24 0 16 0 0 0 -20 0 0 0 6 box5.dat
  [1,16,0,24,0,16,0,0,0,-20,0,0,0,6, ldraw_lib__box5(realsolid)],
// 4 16 20 24 10 16 24 6 -16 24 6 -20 24 10
  [4,16,20,24,10,16,24,6,-16,24,6,-20,24,10],
// 4 16 -20 24 10 -16 24 6 -16 24 -6 -20 24 -10
  [4,16,-20,24,10,-16,24,6,-16,24,-6,-20,24,-10],
// 4 16 -20 24 -10 -16 24 -6 16 24 -6 20 24 -10
  [4,16,-20,24,-10,-16,24,-6,16,24,-6,20,24,-10],
// 4 16 20 24 -10 16 24 -6 16 24 6 20 24 10
  [4,16,20,24,-10,16,24,-6,16,24,6,20,24,10],
// 1 16 0 24 0 20 0 0 0 -24 0 0 0 10 box4t.dat
  [1,16,0,24,0,20,0,0,0,-24,0,0,0,10, ldraw_lib__box4t(realsolid)],
// 1 16 10 0 0 1 0 0 0 1 0 0 0 1 stud.dat
  [1,16,10,0,0,1,0,0,0,1,0,0,0,1, ldraw_lib__stud(realsolid)],
// 1 16 -10 0 0 1 0 0 0 1 0 0 0 1 stud.dat
  [1,16,-10,0,0,1,0,0,0,1,0,0,0,1, ldraw_lib__stud(realsolid)],
// 0
];
module ldraw_lib__s__3004s01(step=0, col=false, unit=2/5, alt=false, line=0.2, solid=!$preview)
    makepoly(ldraw_lib__s__3004s01(solid), step=step, col=col, unit=unit, alt=alt, line=line, solid=solid);
ldraw_lib__s__3004s01(line=0.2);
// file: s/3005s01.scad
use <../../lib.scad>
use <../../p/box4t.scad>
use <../../p/box5.scad>
use <../../p/stud.scad>
$fa=1; $fs=0.2;
function ldraw_lib__s__3005s01(realsolid=false) = [
// 0 ~Brick  1 x  1 without Front Face
// 0 Name: s\3005s01.dat
// 0 Author: John Riley [jriley]
// 0 !LDRAW_ORG Subpart UPDATE 2004-01
// 0 !LICENSE Licensed under CC BY 2.0 and CC BY 4.0 : see CAreadme.txt
// 
// 0 BFC CERTIFY CCW
  [0,"BFC","CERTIFY"],
  [0,"BFC","CCW"],
// 
// 0 !HISTORY 2003-09-07 [jriley] BFCed & Subfiled
// 0 !HISTORY 2004-03-02 [PTadmin] Official Update 2004-01
// 0 !HISTORY 2007-08-29 [PTadmin] Header formatted for Contributor Agreement
// 0 !HISTORY 2008-07-01 [PTadmin] Official Update 2008-01
// 
// 
// 0 BFC INVERTNEXT
  [0,"BFC","INVERTNEXT"],
// 1 16 0 24 0 0 0 6 0 -20 0 -6 0 0 box5.dat
  [1,16,0,24,0,0,0,6,0,-20,0,-6,0,0, ldraw_lib__box5(realsolid)],
// 4 16 10 24 -10 6 24 -6 6 24 6 10 24 10
  [4,16,10,24,-10,6,24,-6,6,24,6,10,24,10],
// 4 16 10 24 10 6 24 6 -6 24 6 -10 24 10
  [4,16,10,24,10,6,24,6,-6,24,6,-10,24,10],
// 4 16 -10 24 10 -6 24 6 -6 24 -6 -10 24 -10
  [4,16,-10,24,10,-6,24,6,-6,24,-6,-10,24,-10],
// 4 16 -10 24 -10 -6 24 -6 6 24 -6 10 24 -10
  [4,16,-10,24,-10,-6,24,-6,6,24,-6,10,24,-10],
// 1 16 0 24 0 10 0 0 0 -24 0 0 0 10 box4t.dat
  [1,16,0,24,0,10,0,0,0,-24,0,0,0,10, ldraw_lib__box4t(realsolid)],
// 1 16 0 0 0 0 0 1 0 1 0 -1 0 0 stud.dat
  [1,16,0,0,0,0,0,1,0,1,0,-1,0,0, ldraw_lib__stud(realsolid)],
// 0
];
module ldraw_lib__s__3005s01(step=0, col=false, unit=2/5, alt=false, line=0.2, solid=!$preview)
    makepoly(ldraw_lib__s__3005s01(solid), step=step, col=col, unit=unit, alt=alt, line=line, solid=solid);
ldraw_lib__s__3005s01(line=0.2);
// file: 3004.scad
use <../lib.scad>
use <s/3004s01.scad>
$fa=1; $fs=0.2;
function ldraw_lib__3004(realsolid=false) = [
// 0 Brick  1 x  2
// 0 Name: 3004.dat
// 0 Author: James Jessiman
// 0 !LDRAW_ORG Part UPDATE 2022-05
// 0 !LICENSE Licensed under CC BY 2.0 and CC BY 4.0 : see CAreadme.txt
// 
// 0 BFC CERTIFY CCW
  [0,"BFC","CERTIFY"],
  [0,"BFC","CCW"],
// 
// 0 !HISTORY 2001-10-26 [PTadmin] Official Update 2001-01
// 0 !HISTORY 2002-05-07 {unknown} BFC Certification
// 0 !HISTORY 2002-06-11 [PTadmin] Official Update 2002-03
// 0 !HISTORY 2007-05-07 [PTadmin] Header formatted for Contributor Agreement
// 0 !HISTORY 2008-07-01 [PTadmin] Official Update 2008-01
// 0 !HISTORY 2022-08-04 [MagFors] Using subfile
// 0 !HISTORY 2022-09-15 [PTadmin] Official Update 2022-05
// 
// 
// 1 16 0 0 0 1 0 0 0 1 0 0 0 1 s\3004s01.dat
  [1,16,0,0,0,1,0,0,0,1,0,0,0,1, ldraw_lib__s__3004s01(realsolid)],
// 4 16 -20 24 -10 20 24 -10 20 0 -10 -20 0 -10
  [4,16,-20,24,-10,20,24,-10,20,0,-10,-20,0,-10],
];
module ldraw_lib__3004(step=0, col=false, unit=2/5, alt=false, line=0.2, solid=!$preview)
    makepoly(ldraw_lib__3004(solid), step=step, col=col, unit=unit, alt=alt, line=line, solid=solid);
ldraw_lib__3004(line=0.2);
// file: 3005ptk.scad
use <../lib.scad>
use <s/3005s01.scad>
$fa=1; $fs=0.2;
function ldraw_lib__3005ptk(realsolid=false) = [
// 0 Brick  1 x  1 with Blue "K" Pattern
// 0 Name: 3005ptk.dat
// 0 Author: Tore Eriksson [Tore_Eriksson]
// 0 !LDRAW_ORG Part UPDATE 2004-03
// 0 !LICENSE Licensed under CC BY 2.0 and CC BY 4.0 : see CAreadme.txt
// 
// 0 BFC CERTIFY CCW
  [0,"BFC","CERTIFY"],
  [0,"BFC","CCW"],
// 
// 0 !HISTORY 2003-12-09 [Steffen] made use of existing subfile
// 0 !HISTORY 2004-09-15 [PTadmin] Official Update 2004-03
// 0 !HISTORY 2007-05-11 [PTadmin] Header formatted for Contributor Agreement
// 0 !HISTORY 2008-07-01 [PTadmin] Official Update 2008-01
// 
// 
// 1 16 0 0 0 1 0 0 0 1 0 0 0 1 s\3005s01.dat
  [1,16,0,0,0,1,0,0,0,1,0,0,0,1, ldraw_lib__s__3005s01(realsolid)],
// 4 1 -6 5 -10 -6 19 -10 -4 19 -10 -4 5 -10
  [4,1,-6,5,-10,-6,19,-10,-4,19,-10,-4,5,-10],
// 4 1 6 5 -10 3.5 5 -10 -4 12 -10 -4 14 -10
  [4,1,6,5,-10,3.5,5,-10,-4,12,-10,-4,14,-10],
// 4 1 3.5 19 -10 6 19 -10 0.6 9.86 -10 -0.75 11.075 -10
  [4,1,3.5,19,-10,6,19,-10,0.6,9.86,-10,-0.75,11.075,-10],
// 4 16 -10 0 -10 -6 5 -10 6 5 -10 10 0 -10
  [4,16,-10,0,-10,-6,5,-10,6,5,-10,10,0,-10],
// 4 16 10 0 -10 6 5 -10 6 19 -10 10 24 -10
  [4,16,10,0,-10,6,5,-10,6,19,-10,10,24,-10],
// 4 16 10 24 -10 6 19 -10 -6 19 -10 -10 24 -10
  [4,16,10,24,-10,6,19,-10,-6,19,-10,-10,24,-10],
// 4 16 -10 24 -10 -6 19 -10 -6 5 -10 -10 0 -10
  [4,16,-10,24,-10,-6,19,-10,-6,5,-10,-10,0,-10],
// 3 16 -4 12 -10 3.5 5 -10 -4 5 -10
  [3,16,-4,12,-10,3.5,5,-10,-4,5,-10],
// 4 16 -0.75 11.075 -10 -4 14 -10 -4 19 -10 3.5 19 -10
  [4,16,-0.75,11.075,-10,-4,14,-10,-4,19,-10,3.5,19,-10],
// 3 16 6 19 -10 6 5 -10 0.6 9.86 -10
  [3,16,6,19,-10,6,5,-10,0.6,9.86,-10],
// 0
];
module ldraw_lib__3005ptk(step=0, col=false, unit=2/5, alt=false, line=0.2, solid=!$preview)
    makepoly(ldraw_lib__3005ptk(solid), step=step, col=col, unit=unit, alt=alt, line=line, solid=solid);
ldraw_lib__3005ptk(line=0.2);
// main file
use <../lib.scad>
use <3005ptk.scad>
$fa=1; $fs=0.2;
function ldraw_lib__3005_k(realsolid=false) = [
// 0 ~Moved to 3005ptk
// 0 Name: 3005-k.dat
// 0 Author: [PTadmin]
// 0 !LDRAW_ORG Part UPDATE 2004-03
// 0 !LICENSE Licensed under CC BY 4.0 : see CAreadme.txt
// 
// 0 BFC CERTIFY CCW
  [0,"BFC","CERTIFY"],
  [0,"BFC","CCW"],
// 
// 0 !HISTORY 1998-12-15 [PTadmin] Official Update 1998-10
// 0 !HISTORY 2004-09-15 [PTadmin] Official Update 2004-03
// 0 !HISTORY 2007-05-11 [PTadmin] Header formatted for Contributor Agreement
// 0 !HISTORY 2008-07-01 [PTadmin] Official Update 2008-01
// 
// 
// 1 16 0 0 0 1 0 0 0 1 0 0 0 1 3005ptk.dat
  [1,16,0,0,0,1,0,0,0,1,0,0,0,1, ldraw_lib__3005ptk(realsolid)],
];
module ldraw_lib__3005_k(step=0, col=false, unit=2/5, alt=false, line=0.2, solid=!$preview)
    makepoly(ldraw_lib__3005_k(solid), step=step, col=col, unit=unit, alt=alt, line=line, solid=solid);
ldraw_lib__3005_k(line=0.2);
